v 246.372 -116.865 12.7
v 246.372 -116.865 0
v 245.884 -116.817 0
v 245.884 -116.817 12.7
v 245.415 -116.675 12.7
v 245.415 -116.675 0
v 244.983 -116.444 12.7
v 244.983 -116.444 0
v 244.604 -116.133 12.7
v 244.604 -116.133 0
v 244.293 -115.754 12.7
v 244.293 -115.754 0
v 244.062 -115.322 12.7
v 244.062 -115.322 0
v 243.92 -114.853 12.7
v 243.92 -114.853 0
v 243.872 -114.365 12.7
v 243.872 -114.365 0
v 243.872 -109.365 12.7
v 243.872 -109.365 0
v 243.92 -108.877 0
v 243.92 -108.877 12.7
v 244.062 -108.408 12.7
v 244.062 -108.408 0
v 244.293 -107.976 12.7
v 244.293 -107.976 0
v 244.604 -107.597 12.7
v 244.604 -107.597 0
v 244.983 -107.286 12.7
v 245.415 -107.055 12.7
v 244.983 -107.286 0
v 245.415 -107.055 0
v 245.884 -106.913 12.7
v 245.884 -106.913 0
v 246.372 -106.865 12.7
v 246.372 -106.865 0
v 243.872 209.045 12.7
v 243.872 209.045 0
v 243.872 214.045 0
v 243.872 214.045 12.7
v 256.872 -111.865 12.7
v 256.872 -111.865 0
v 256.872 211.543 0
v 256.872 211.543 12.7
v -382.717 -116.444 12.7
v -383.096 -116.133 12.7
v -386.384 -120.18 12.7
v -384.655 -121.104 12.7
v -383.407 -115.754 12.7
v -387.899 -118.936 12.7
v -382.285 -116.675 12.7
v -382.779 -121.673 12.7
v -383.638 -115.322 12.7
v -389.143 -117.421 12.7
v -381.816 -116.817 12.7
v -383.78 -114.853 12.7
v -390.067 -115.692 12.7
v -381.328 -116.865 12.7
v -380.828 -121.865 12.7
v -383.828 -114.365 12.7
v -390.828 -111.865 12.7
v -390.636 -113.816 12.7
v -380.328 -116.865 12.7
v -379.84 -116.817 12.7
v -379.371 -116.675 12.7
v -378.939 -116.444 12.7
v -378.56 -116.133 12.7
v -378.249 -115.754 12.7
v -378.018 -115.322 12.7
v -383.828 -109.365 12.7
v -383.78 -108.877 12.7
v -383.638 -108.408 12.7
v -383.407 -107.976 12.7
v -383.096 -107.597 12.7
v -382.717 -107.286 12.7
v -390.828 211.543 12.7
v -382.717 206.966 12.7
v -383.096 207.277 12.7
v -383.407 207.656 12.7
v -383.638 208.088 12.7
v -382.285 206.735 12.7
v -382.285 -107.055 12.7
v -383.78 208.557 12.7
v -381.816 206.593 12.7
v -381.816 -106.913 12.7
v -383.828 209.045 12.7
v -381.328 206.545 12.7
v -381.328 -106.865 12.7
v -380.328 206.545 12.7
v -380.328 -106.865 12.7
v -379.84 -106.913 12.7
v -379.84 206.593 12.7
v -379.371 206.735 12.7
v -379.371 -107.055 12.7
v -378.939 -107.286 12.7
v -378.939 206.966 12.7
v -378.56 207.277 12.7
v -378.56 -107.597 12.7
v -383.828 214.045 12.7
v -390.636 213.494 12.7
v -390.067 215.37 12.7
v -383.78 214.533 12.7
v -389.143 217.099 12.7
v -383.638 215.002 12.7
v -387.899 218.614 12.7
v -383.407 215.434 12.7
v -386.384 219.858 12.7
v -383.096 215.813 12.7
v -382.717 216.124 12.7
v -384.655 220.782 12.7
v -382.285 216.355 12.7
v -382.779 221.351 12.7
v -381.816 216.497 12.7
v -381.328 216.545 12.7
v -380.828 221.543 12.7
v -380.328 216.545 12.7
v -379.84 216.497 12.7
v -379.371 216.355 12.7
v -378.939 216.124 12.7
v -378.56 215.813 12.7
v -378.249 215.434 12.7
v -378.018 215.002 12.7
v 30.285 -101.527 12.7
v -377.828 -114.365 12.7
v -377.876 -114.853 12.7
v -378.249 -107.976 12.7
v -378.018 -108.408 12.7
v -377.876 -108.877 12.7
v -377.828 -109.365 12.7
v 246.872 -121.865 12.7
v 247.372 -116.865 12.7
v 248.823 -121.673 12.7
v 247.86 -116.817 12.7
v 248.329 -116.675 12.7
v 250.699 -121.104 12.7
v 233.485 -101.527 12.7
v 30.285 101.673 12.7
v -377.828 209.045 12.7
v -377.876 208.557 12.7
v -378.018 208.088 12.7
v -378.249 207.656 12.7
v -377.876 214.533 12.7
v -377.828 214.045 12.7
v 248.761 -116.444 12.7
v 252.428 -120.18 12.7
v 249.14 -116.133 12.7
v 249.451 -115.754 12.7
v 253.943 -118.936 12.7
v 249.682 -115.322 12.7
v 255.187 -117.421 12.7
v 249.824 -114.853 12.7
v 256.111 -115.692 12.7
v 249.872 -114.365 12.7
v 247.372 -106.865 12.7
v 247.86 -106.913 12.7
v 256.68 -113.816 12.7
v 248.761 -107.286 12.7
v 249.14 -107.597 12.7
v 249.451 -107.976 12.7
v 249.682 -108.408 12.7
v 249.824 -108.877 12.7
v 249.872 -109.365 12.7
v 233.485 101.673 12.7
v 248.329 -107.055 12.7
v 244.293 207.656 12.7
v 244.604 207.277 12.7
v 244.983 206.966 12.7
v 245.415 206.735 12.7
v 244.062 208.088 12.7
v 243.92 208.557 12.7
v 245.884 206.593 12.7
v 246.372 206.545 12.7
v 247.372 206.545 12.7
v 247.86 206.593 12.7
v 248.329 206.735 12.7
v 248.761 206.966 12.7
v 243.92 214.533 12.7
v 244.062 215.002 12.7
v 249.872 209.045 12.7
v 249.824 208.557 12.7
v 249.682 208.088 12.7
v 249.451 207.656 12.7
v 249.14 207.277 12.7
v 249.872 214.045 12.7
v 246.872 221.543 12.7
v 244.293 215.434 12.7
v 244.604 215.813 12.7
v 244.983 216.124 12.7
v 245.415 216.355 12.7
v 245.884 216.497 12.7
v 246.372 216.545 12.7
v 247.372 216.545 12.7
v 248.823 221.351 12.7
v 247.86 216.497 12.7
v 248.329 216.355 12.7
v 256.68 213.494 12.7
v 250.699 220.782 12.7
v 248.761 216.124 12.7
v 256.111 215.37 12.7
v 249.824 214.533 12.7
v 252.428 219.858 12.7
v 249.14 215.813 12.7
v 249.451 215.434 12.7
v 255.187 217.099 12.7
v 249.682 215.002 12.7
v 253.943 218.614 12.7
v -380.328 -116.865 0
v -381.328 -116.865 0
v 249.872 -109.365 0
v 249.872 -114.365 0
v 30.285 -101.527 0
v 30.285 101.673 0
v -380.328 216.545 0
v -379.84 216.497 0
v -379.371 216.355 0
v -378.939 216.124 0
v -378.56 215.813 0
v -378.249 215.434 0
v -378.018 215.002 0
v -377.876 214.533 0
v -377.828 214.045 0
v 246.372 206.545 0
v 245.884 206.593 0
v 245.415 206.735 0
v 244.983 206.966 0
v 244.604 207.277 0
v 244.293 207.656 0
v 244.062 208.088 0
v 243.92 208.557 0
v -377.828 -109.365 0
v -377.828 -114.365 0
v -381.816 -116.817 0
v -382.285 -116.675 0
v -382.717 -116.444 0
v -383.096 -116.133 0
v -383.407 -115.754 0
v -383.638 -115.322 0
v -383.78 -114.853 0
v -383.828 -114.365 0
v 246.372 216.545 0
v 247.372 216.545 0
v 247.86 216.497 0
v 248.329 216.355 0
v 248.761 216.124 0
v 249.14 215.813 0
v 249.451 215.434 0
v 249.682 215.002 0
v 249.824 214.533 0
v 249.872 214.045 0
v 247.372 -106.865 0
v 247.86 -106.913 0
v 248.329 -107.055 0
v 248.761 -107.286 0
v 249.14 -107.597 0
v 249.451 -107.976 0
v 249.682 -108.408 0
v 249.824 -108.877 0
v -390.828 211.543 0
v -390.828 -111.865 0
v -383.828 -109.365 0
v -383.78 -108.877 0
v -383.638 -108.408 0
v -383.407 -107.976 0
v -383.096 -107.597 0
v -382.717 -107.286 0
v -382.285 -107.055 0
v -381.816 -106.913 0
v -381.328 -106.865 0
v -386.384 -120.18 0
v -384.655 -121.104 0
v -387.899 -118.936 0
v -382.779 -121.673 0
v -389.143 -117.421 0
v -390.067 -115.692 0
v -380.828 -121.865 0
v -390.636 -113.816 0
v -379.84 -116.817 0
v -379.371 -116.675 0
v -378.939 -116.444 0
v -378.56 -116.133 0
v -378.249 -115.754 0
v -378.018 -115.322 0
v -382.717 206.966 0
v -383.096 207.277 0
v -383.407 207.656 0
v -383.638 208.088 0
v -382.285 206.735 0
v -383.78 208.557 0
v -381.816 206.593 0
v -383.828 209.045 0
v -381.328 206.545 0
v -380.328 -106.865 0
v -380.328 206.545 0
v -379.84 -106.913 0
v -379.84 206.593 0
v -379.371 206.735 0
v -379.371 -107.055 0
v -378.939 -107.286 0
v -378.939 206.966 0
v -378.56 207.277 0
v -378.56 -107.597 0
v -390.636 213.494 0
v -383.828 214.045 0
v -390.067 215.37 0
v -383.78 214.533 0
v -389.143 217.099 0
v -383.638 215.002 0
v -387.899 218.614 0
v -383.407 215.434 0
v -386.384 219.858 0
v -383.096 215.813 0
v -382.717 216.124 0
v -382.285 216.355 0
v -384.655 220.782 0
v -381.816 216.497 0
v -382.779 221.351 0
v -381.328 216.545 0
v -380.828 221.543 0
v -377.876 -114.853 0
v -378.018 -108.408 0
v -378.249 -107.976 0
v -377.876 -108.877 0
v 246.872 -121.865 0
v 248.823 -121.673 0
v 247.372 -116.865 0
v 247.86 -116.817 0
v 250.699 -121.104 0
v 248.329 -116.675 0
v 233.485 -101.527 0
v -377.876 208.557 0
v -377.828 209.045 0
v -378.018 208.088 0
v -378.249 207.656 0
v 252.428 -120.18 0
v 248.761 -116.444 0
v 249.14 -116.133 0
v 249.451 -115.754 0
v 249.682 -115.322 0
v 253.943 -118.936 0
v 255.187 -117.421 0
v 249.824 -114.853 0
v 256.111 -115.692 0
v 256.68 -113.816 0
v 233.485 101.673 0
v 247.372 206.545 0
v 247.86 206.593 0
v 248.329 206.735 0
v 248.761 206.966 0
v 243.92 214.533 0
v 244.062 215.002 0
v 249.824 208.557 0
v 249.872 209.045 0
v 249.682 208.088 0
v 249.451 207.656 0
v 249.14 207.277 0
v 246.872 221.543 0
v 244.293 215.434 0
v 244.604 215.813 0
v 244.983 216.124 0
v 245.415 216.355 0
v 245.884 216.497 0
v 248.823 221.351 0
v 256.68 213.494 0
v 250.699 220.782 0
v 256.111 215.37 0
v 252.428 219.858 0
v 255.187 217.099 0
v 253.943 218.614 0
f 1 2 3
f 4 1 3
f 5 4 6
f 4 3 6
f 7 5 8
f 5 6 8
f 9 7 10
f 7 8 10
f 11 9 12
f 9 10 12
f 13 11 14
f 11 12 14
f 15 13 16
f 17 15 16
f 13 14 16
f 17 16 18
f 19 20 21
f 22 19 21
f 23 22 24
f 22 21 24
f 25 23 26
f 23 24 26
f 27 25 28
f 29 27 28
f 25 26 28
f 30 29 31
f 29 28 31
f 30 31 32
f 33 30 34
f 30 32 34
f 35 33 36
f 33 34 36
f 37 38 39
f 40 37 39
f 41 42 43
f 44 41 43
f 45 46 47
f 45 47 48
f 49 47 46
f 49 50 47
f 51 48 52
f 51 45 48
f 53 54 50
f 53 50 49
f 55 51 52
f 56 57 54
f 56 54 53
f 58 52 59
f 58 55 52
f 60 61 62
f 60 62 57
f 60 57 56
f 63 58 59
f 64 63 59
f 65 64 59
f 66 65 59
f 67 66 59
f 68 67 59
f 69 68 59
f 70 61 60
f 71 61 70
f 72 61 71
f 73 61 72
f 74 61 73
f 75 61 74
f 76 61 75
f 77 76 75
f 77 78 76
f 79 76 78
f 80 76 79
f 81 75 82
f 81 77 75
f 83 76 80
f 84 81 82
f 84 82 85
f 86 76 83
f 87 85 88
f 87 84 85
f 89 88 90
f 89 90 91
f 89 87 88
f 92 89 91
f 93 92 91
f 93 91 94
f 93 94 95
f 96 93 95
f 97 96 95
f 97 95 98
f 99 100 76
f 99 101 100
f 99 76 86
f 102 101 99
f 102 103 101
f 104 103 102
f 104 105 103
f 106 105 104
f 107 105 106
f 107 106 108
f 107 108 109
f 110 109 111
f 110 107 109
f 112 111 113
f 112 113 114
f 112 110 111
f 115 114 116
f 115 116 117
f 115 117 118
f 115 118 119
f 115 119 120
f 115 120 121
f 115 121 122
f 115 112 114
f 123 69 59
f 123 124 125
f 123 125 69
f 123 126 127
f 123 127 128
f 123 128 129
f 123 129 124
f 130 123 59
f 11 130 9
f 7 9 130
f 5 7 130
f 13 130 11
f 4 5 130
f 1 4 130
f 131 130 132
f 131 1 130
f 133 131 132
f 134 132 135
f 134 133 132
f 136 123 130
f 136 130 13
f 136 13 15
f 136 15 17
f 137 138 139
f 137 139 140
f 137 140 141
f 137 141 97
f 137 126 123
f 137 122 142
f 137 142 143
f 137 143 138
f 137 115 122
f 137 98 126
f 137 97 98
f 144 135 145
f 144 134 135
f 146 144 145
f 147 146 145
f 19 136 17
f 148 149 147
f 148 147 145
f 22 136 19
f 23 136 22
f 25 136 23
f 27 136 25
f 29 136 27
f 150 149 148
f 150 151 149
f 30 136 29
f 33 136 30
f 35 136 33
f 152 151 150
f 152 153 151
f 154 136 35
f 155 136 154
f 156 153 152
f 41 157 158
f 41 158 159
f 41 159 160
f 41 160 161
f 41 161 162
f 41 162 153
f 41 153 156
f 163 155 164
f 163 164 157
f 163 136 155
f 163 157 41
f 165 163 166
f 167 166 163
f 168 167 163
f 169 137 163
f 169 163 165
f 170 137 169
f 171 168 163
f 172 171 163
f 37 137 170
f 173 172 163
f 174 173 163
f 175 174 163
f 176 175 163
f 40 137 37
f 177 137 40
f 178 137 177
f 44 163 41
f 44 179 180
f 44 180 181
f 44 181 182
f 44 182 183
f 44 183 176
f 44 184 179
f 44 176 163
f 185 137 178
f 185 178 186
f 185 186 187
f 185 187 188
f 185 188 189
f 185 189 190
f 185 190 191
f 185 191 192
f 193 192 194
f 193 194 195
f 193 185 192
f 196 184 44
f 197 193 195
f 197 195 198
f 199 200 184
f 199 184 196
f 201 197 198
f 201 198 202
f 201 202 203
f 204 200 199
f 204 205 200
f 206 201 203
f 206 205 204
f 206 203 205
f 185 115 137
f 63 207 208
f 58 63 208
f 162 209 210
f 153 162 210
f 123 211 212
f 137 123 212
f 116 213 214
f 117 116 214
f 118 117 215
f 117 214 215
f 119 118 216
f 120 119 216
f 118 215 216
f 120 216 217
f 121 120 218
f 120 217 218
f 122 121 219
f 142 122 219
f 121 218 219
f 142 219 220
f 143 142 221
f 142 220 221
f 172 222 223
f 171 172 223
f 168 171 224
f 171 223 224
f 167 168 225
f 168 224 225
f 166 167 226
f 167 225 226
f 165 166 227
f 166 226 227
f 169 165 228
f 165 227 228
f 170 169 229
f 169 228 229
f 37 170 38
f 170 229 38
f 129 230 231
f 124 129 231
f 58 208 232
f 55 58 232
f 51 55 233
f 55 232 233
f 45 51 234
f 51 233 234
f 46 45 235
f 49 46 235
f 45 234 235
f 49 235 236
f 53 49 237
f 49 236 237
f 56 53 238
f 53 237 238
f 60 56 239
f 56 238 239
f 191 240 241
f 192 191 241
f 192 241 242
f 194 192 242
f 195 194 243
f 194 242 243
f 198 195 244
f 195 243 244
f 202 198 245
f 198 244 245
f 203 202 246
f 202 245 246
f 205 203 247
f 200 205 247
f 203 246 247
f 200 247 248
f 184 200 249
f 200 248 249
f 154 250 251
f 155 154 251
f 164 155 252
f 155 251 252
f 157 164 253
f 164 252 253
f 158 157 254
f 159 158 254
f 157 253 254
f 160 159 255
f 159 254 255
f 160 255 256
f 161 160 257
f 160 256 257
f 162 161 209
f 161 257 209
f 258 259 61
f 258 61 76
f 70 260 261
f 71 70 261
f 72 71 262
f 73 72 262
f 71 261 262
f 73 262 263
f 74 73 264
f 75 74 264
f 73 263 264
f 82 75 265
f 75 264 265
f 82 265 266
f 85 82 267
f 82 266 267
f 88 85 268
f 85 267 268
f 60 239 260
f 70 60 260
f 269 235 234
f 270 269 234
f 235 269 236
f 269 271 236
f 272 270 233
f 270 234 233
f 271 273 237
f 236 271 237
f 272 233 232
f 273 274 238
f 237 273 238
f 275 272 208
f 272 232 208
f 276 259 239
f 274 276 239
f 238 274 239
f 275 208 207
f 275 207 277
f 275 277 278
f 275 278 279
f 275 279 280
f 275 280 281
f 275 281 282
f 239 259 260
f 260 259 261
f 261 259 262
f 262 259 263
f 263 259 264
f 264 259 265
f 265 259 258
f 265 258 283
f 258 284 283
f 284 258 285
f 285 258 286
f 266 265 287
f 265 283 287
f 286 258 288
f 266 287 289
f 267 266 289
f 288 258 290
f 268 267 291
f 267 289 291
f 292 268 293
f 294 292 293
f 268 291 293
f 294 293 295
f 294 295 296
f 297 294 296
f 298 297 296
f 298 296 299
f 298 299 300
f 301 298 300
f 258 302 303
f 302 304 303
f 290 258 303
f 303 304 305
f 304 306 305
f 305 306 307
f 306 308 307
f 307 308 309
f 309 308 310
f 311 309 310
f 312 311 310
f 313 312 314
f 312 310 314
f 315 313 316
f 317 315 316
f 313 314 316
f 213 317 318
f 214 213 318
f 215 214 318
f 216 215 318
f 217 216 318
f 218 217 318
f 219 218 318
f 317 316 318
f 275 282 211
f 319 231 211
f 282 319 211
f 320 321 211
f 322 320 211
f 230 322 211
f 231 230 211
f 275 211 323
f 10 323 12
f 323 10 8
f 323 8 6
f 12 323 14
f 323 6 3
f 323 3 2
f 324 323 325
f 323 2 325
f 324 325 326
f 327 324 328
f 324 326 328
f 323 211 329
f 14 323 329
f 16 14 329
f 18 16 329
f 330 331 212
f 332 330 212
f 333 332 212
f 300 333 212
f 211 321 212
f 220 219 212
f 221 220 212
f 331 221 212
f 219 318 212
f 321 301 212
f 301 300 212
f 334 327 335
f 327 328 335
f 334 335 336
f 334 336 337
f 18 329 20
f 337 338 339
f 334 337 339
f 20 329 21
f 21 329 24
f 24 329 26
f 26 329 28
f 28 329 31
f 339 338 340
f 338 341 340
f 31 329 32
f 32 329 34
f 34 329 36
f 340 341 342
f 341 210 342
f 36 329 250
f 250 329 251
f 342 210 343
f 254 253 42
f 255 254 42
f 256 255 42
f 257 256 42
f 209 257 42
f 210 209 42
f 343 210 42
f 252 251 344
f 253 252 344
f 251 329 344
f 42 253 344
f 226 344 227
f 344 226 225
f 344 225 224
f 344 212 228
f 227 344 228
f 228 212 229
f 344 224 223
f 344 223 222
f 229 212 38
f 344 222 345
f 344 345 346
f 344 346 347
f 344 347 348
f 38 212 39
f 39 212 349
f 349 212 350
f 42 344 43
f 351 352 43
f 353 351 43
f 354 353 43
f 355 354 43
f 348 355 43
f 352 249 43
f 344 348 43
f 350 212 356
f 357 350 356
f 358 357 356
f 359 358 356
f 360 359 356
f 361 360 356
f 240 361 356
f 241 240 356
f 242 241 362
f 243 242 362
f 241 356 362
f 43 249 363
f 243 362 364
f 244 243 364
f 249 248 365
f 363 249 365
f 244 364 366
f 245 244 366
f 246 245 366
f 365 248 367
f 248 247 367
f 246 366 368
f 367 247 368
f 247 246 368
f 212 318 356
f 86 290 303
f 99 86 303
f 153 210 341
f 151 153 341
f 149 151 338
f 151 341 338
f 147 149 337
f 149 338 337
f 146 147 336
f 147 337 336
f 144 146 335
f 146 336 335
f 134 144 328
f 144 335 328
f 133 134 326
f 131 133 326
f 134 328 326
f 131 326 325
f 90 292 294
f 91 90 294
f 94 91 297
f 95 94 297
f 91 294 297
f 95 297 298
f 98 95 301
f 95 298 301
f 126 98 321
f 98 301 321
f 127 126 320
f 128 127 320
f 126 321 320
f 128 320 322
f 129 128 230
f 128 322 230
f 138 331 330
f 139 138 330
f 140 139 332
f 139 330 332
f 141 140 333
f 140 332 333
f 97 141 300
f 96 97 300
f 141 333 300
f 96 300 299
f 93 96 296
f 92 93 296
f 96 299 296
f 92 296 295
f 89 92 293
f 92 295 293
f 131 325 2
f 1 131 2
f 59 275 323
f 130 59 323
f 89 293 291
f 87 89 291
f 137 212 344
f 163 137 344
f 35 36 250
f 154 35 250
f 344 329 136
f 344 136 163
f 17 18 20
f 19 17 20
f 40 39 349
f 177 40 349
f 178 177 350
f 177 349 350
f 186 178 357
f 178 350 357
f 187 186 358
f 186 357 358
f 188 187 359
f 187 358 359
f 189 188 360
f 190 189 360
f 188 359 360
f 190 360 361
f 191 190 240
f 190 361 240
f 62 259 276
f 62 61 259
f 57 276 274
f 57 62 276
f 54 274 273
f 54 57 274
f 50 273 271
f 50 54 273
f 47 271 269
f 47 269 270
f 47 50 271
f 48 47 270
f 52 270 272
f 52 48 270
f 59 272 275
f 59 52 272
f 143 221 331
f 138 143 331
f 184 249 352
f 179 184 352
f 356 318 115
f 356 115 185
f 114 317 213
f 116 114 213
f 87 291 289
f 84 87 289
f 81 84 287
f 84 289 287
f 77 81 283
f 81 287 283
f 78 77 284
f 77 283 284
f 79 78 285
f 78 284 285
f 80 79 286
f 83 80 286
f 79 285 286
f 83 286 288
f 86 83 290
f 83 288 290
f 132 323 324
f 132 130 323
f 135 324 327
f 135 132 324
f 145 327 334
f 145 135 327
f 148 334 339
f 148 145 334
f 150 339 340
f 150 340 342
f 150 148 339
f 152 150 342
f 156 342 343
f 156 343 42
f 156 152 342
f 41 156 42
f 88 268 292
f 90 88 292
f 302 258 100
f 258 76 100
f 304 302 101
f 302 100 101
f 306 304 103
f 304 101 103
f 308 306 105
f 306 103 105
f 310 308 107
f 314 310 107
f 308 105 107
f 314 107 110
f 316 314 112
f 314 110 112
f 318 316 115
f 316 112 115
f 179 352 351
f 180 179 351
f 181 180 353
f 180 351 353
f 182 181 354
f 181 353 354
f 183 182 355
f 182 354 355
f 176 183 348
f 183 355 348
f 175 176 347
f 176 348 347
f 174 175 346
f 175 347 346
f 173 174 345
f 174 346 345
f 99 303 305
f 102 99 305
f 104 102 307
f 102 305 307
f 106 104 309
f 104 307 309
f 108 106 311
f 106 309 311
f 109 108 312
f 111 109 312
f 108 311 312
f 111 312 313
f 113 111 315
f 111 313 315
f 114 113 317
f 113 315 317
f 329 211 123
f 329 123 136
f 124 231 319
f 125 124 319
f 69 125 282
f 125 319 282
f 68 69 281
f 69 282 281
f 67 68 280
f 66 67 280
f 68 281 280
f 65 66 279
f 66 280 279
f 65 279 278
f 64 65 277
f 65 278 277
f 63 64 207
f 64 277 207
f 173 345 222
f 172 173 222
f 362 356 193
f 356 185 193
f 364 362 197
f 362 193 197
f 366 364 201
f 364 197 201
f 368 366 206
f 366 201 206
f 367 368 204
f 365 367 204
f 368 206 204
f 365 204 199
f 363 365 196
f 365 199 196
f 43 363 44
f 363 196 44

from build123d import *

# Parameters (mm, degrees)
SKETCH1_W           = 647.7
SKETCH1_H           = 343.408
SKETCH1_W_2         = 203.2
SKETCH1_H_2         = 203.2
BOSS_EXTRUDE1_DEPTH = 12.7
FILLET1_R           = 10


with BuildPart() as part:
    # Sketch1 → Boss-Extrude1 (new body)
    with BuildSketch(Plane.XY):
        with Locations((-66.978068182, 49.838840909)):
            Rectangle(SKETCH1_W, SKETCH1_H)
        with BuildLine():
            Line((247.371931818, -116.865159091), (246.371931818, -116.865159091))
            ThreePointArc((246.371931818, -116.865159091), (244.604164865, -116.132926044), (243.871931818, -114.365159091))
            Line((243.871931818, -114.365159091), (243.871931818, -109.365159091))
            ThreePointArc((243.871931818, -109.365159091), (244.604164865, -107.597392138), (246.371931818, -106.865159091))
            Line((246.371931818, -106.865159091), (247.371931818, -106.865159091))
            ThreePointArc((247.371931818, -106.865159091), (249.139698771, -107.597392138), (249.871931818, -109.365159091))
            Line((249.871931818, -109.365159091), (249.871931818, -114.365159091))
            ThreePointArc((249.871931818, -114.365159091), (249.139698771, -116.132926044), (247.371931818, -116.865159091))
        make_face(mode=Mode.SUBTRACT)
        with Locations((131.884838954, 0.072858907)):
            Rectangle(SKETCH1_W_2, SKETCH1_H_2, mode=Mode.SUBTRACT)
        with BuildLine():
            Line((-380.328068182, -116.865159091), (-381.328068182, -116.865159091))
            ThreePointArc((-381.328068182, -116.865159091), (-383.095835135, -116.132926044), (-383.828068182, -114.365159091))
            Line((-383.828068182, -114.365159091), (-383.828068182, -109.365159091))
            ThreePointArc((-383.828068182, -109.365159091), (-383.095835135, -107.597392138), (-381.328068182, -106.865159091))
            Line((-381.328068182, -106.865159091), (-380.328068182, -106.865159091))
            ThreePointArc((-380.328068182, -106.865159091), (-378.560301229, -107.597392138), (-377.828068182, -109.365159091))
            Line((-377.828068182, -109.365159091), (-377.828068182, -114.365159091))
            ThreePointArc((-377.828068182, -114.365159091), (-378.560301229, -116.132926044), (-380.328068182, -116.865159091))
        make_face(mode=Mode.SUBTRACT)
        with BuildLine():
            Line((-380.328068182, 206.544840909), (-381.328068182, 206.544840909))
            ThreePointArc((-381.328068182, 206.544840909), (-383.095835135, 207.277073956), (-383.828068182, 209.044840909))
            Line((-383.828068182, 209.044840909), (-383.828068182, 214.044840909))
            ThreePointArc((-383.828068182, 214.044840909), (-383.095835135, 215.812607862), (-381.328068182, 216.544840909))
            Line((-381.328068182, 216.544840909), (-380.328068182, 216.544840909))
            ThreePointArc((-380.328068182, 216.544840909), (-378.560301229, 215.812607862), (-377.828068182, 214.044840909))
            Line((-377.828068182, 214.044840909), (-377.828068182, 209.044840909))
            ThreePointArc((-377.828068182, 209.044840909), (-378.560301229, 207.277073956), (-380.328068182, 206.544840909))
        make_face(mode=Mode.SUBTRACT)
        with BuildLine():
            Line((247.371931818, 206.544840909), (246.371931818, 206.544840909))
            ThreePointArc((246.371931818, 206.544840909), (244.604164865, 207.277073956), (243.871931818, 209.044840909))
            Line((243.871931818, 209.044840909), (243.871931818, 214.044840909))
            ThreePointArc((243.871931818, 214.044840909), (244.604164865, 215.812607862), (246.371931818, 216.544840909))
            Line((246.371931818, 216.544840909), (247.371931818, 216.544840909))
            ThreePointArc((247.371931818, 216.544840909), (249.139698771, 215.812607862), (249.871931818, 214.044840909))
            Line((249.871931818, 214.044840909), (249.871931818, 209.044840909))
            ThreePointArc((249.871931818, 209.044840909), (249.139698771, 207.277073956), (247.371931818, 206.544840909))
        make_face(mode=Mode.SUBTRACT)
    extrude(amount=BOSS_EXTRUDE1_DEPTH)

    # Fillet1
    fillet1_edges = [part.edges().sort_by_distance(p)[0] for p in [
        (-390.828068182, 221.542840909, 6.35),
        (256.871931818, 221.542840909, 6.35),
        (256.871931818, -121.865159091, 6.35),
        (-390.828068182, -121.865159091, 6.35),
    ]]
    fillet(fillet1_edges, radius=FILLET1_R)


solid = part.part
